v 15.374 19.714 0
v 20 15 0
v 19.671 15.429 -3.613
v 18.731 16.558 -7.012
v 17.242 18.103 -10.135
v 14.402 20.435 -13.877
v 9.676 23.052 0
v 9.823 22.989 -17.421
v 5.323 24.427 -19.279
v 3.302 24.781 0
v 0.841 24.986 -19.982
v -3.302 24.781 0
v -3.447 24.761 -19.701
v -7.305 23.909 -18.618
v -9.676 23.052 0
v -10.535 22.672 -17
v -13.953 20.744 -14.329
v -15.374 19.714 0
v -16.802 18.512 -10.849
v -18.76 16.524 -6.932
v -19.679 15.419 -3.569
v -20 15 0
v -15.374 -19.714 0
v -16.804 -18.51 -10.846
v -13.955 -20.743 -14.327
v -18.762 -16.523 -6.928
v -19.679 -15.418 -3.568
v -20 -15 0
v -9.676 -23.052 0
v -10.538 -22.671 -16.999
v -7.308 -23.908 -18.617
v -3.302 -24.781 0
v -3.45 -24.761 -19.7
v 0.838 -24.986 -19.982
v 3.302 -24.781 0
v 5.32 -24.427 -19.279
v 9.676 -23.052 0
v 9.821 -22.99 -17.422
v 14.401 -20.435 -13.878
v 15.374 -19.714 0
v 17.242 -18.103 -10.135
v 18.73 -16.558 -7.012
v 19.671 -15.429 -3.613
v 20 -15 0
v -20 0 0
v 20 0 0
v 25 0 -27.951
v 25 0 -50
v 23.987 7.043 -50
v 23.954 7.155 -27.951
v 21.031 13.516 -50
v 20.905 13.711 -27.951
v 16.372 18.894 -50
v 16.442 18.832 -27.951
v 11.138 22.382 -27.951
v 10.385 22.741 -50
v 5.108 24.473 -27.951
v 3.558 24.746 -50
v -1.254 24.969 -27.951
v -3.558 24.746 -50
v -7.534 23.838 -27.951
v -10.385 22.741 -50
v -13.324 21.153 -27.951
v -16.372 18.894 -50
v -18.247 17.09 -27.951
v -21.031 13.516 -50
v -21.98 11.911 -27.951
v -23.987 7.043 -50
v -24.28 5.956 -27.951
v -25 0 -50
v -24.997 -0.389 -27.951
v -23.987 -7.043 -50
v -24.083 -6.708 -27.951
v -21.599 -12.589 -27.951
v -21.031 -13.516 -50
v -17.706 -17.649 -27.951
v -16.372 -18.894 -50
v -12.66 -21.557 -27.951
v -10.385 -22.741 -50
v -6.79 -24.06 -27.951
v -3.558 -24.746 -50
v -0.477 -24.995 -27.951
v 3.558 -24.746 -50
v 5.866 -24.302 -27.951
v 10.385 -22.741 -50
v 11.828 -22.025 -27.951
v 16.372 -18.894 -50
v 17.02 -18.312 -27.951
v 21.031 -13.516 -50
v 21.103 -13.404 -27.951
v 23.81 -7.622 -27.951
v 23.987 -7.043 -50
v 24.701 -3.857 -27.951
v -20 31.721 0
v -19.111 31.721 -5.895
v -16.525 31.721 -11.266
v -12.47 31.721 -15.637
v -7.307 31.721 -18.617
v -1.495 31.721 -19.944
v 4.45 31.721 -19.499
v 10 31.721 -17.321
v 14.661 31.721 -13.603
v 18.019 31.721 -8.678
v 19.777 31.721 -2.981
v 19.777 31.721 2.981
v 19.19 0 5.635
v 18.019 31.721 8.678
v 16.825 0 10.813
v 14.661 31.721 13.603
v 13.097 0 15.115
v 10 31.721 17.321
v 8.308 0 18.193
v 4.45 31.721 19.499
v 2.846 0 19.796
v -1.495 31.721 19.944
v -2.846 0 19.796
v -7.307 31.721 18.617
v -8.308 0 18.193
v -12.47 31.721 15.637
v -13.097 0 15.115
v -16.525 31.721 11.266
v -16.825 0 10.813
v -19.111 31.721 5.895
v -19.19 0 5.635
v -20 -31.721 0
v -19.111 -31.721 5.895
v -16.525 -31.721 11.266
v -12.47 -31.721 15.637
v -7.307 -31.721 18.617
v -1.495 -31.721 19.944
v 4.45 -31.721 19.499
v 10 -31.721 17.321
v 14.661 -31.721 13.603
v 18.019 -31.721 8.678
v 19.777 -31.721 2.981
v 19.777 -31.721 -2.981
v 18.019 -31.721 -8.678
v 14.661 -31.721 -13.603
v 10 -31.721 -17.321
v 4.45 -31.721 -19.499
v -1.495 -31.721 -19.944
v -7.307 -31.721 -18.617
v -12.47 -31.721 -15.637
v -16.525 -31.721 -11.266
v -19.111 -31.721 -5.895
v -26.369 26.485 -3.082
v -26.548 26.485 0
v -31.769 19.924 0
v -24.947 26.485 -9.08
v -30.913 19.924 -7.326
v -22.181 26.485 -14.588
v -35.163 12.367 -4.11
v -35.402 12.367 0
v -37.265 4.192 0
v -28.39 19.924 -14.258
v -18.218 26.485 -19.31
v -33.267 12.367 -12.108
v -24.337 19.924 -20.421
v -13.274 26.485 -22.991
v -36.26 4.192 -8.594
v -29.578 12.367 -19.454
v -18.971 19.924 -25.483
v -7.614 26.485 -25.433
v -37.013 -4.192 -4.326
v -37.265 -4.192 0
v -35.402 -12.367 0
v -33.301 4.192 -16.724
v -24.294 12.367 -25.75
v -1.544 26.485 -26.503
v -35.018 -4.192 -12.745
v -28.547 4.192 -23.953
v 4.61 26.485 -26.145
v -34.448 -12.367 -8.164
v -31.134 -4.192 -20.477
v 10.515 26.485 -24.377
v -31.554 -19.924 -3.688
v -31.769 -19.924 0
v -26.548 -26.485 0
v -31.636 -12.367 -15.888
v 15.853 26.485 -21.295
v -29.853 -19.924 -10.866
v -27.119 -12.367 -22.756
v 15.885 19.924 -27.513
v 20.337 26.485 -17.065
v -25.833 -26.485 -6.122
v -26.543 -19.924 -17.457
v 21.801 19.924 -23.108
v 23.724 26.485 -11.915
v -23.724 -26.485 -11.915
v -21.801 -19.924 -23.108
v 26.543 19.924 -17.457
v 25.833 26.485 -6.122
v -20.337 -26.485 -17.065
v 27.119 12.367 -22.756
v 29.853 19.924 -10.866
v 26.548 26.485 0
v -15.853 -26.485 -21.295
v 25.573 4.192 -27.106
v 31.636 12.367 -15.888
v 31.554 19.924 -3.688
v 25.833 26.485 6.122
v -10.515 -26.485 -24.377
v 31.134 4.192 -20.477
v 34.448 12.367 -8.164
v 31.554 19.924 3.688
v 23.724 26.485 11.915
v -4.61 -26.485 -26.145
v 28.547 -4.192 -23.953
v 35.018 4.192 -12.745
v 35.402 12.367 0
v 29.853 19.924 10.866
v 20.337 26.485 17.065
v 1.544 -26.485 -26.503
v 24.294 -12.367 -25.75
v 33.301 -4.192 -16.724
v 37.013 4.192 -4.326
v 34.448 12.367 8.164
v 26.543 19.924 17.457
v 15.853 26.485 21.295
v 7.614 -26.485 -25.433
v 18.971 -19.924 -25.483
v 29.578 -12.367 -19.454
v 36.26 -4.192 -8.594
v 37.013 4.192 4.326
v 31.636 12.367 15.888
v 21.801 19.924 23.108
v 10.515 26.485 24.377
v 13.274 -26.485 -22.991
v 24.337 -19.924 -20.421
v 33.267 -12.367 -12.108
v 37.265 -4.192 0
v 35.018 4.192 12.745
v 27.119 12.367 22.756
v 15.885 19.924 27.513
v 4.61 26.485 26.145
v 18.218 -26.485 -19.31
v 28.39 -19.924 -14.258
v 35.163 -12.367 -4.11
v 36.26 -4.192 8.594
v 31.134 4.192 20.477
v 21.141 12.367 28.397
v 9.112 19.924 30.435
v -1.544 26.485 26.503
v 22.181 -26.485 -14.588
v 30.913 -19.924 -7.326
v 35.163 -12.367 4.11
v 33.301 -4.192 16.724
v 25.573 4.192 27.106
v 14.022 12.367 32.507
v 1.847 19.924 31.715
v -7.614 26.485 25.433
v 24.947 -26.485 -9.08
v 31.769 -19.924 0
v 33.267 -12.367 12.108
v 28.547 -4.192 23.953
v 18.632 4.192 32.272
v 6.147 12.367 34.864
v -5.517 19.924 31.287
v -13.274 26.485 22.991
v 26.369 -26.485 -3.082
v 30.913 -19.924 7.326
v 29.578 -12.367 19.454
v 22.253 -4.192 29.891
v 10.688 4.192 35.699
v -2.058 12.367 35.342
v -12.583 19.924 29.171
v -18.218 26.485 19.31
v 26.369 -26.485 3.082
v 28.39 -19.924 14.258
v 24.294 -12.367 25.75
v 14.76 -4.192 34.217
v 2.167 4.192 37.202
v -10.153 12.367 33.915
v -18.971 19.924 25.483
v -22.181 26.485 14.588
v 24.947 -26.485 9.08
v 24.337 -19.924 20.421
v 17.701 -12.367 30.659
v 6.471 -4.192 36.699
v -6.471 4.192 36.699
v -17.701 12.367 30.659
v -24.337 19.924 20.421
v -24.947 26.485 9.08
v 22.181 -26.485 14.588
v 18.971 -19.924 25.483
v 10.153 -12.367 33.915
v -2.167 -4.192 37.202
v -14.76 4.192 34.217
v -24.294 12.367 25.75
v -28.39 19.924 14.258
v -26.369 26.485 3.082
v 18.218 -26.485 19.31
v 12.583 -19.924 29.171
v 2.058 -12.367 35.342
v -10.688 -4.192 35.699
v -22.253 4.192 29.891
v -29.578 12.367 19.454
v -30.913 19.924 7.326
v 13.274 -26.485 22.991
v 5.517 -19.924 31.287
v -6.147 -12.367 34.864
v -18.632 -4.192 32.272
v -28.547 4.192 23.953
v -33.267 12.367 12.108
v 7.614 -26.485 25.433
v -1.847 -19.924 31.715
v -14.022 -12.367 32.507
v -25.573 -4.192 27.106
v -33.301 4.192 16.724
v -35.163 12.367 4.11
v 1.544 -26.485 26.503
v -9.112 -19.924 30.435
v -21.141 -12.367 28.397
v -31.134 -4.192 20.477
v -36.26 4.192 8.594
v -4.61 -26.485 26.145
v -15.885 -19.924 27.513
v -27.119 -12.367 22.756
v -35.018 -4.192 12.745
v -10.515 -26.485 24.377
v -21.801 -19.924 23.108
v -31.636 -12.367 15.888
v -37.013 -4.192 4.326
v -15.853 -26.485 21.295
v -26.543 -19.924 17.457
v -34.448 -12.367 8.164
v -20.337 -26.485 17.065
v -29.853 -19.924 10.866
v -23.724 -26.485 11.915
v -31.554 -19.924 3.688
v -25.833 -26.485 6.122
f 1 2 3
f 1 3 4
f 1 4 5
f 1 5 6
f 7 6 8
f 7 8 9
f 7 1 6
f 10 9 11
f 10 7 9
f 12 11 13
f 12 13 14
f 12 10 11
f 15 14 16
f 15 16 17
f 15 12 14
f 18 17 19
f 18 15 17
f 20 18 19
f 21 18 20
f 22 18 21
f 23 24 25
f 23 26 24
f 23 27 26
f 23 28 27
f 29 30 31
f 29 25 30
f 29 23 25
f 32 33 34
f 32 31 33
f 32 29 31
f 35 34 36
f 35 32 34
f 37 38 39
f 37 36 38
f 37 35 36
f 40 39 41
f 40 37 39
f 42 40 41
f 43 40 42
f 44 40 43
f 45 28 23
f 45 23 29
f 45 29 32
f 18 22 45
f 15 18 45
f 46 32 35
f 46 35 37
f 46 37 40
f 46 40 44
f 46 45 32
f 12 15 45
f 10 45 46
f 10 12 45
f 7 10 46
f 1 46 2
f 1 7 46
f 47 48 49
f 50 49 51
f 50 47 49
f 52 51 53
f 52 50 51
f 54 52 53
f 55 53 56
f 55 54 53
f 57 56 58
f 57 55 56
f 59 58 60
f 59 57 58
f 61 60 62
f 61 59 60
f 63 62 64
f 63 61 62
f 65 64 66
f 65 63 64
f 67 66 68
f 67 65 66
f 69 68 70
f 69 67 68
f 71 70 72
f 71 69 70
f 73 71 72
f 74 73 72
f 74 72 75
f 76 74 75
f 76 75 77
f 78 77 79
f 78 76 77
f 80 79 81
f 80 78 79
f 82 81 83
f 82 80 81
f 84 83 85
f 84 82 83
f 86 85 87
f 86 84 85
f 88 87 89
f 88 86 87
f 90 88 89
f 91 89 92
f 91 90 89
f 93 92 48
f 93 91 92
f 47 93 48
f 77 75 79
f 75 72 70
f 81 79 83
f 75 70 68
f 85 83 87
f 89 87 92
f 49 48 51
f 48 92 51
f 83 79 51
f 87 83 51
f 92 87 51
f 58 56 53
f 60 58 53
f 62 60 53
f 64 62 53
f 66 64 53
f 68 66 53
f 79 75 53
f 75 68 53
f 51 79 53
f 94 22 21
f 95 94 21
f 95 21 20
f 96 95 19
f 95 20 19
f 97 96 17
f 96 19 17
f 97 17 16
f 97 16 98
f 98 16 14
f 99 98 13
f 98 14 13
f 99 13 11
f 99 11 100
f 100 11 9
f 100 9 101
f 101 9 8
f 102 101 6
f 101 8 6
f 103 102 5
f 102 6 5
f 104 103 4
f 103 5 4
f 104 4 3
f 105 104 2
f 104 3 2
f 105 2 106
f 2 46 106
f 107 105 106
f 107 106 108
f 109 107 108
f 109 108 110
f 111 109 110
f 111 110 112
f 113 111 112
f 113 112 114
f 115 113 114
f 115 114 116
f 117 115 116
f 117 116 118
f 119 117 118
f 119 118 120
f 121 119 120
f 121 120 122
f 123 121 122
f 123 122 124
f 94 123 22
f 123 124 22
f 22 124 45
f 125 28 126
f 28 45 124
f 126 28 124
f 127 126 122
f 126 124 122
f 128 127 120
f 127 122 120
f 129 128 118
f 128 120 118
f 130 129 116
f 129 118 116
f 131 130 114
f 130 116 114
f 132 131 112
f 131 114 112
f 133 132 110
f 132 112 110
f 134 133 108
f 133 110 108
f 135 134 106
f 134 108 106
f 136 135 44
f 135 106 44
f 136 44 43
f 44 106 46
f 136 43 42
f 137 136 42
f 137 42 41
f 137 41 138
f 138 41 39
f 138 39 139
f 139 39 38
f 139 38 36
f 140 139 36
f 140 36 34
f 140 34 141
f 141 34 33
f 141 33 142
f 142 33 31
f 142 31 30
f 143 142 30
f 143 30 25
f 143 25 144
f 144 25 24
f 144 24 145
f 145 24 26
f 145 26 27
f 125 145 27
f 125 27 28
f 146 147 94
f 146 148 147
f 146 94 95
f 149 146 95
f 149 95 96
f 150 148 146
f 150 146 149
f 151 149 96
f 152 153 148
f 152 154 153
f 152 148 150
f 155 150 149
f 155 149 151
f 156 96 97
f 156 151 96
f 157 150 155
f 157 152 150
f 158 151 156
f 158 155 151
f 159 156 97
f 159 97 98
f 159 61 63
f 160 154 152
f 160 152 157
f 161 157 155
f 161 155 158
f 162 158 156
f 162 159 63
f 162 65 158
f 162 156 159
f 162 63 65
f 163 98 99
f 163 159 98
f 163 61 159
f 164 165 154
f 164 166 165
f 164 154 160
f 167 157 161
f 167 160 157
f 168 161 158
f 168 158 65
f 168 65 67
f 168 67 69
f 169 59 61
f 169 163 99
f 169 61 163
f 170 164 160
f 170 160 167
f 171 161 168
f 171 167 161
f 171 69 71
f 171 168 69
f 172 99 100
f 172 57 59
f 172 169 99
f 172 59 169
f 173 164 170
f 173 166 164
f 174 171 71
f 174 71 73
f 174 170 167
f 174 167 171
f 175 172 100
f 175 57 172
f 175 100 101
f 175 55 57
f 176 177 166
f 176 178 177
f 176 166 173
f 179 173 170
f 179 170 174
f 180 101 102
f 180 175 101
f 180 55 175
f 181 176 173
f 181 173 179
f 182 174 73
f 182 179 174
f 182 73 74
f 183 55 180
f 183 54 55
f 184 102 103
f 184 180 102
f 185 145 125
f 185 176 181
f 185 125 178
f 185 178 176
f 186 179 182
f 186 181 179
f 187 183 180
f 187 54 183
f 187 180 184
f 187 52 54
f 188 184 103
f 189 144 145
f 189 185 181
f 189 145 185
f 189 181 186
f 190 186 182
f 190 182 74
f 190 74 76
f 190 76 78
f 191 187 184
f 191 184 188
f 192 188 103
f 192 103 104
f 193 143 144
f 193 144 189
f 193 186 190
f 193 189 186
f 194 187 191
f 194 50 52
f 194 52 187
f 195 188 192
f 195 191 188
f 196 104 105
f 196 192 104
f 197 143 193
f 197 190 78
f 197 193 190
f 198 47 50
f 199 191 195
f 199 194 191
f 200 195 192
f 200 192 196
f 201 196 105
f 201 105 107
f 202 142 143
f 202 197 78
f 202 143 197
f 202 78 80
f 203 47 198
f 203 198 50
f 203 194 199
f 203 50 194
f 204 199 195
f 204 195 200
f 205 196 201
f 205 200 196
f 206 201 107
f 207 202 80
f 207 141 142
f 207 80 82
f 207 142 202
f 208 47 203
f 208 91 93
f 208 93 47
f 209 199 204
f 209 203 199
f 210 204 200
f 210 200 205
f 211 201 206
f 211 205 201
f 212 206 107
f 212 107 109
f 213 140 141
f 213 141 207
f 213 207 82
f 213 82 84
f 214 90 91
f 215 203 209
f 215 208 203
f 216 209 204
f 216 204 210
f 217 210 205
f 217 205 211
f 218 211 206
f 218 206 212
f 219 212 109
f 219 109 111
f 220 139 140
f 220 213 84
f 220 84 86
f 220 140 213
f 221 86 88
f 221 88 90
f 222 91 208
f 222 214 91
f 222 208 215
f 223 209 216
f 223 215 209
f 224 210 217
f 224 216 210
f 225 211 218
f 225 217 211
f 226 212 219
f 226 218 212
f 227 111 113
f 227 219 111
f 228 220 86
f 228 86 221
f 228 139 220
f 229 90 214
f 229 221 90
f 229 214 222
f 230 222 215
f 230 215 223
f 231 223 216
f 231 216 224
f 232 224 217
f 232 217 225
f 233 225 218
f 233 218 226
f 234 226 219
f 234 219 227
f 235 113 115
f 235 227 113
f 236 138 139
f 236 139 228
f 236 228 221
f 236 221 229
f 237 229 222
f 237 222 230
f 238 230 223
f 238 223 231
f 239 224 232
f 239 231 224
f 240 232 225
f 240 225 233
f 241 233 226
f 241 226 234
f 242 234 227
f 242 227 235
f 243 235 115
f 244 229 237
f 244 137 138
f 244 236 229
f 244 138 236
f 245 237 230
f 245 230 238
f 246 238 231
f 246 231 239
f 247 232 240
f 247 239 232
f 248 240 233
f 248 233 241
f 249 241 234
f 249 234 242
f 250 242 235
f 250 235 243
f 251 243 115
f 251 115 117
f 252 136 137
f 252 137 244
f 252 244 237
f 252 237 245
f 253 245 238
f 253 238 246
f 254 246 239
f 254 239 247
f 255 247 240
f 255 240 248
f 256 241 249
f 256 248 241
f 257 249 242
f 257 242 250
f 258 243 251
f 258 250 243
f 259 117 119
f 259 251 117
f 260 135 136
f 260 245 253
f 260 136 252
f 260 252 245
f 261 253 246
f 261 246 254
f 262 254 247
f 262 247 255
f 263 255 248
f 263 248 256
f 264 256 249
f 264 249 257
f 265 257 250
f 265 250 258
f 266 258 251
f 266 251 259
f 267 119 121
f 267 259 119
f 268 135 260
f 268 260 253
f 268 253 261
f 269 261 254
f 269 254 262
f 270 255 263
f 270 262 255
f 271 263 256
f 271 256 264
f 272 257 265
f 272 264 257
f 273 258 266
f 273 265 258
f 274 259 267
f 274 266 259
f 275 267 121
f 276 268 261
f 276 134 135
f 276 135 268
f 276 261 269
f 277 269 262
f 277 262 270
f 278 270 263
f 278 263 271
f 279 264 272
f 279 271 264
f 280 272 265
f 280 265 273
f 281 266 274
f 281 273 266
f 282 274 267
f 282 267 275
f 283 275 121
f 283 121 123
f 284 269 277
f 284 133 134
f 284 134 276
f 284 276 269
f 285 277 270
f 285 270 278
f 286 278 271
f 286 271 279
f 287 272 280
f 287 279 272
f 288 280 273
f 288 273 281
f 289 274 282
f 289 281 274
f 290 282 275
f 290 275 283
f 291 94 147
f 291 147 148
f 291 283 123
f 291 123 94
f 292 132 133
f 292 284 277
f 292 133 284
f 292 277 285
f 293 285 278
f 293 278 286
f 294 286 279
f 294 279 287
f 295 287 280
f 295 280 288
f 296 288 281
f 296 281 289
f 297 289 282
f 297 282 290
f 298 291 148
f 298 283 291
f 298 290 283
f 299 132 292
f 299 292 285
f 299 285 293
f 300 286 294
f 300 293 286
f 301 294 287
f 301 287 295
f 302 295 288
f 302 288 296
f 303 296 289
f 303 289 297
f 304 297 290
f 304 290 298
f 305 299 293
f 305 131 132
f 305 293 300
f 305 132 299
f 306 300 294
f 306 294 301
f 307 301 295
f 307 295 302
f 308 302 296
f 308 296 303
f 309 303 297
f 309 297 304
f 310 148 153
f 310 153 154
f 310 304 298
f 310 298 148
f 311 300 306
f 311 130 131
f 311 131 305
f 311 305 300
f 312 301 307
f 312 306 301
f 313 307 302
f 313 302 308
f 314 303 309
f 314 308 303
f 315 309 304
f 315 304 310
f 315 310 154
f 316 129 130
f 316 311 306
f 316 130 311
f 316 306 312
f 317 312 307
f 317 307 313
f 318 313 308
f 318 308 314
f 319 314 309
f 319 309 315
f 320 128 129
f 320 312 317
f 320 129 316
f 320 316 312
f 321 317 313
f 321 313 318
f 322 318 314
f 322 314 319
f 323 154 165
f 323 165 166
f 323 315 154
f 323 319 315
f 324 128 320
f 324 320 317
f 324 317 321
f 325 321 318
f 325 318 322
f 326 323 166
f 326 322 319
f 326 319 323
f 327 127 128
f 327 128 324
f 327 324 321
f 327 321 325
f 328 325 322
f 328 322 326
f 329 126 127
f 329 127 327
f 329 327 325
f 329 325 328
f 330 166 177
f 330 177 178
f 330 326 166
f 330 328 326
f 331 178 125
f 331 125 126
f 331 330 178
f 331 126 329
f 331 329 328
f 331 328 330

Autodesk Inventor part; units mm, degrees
ref_plane "YZ Plane" through (0, 0, 0) normal (1, 0, 0) x (0, 1, 0)
sketch "スケッチ1" plane through (0, 0, 0) normal (0, 0, 1) x (1, 0, 0)
  arc A0 (0, 37.5) -> (0, -37.5) centre (0, 0) ccw
  line L0 (0, 37.5) -> (0, -37.5)
  dimension "d0" = 75
revolve "回転1" add sketch "スケッチ1" angle 360 about axis through (0, 37.5, 0) along (0, -1, 0)
sketch "スケッチ2" plane through (0, 0, 0) normal (0, 1, 0) x (-1, 0, 0)
  circle A0 centre (0, 0) radius 20
  dimension "d2" = 40
extrude "押し出し1" cut sketch "スケッチ2" along normal mid plane 100
sketch "スケッチ3" plane through (0, 0, 0) normal (0, 0, 1) x (1, 0, 0)
  circle A0 centre (0, 0) radius 25
  dimension "d5" = 50
extrude "押し出し2" add sketch "スケッチ3" against normal blind 50
properties part number "LowerarmP"
